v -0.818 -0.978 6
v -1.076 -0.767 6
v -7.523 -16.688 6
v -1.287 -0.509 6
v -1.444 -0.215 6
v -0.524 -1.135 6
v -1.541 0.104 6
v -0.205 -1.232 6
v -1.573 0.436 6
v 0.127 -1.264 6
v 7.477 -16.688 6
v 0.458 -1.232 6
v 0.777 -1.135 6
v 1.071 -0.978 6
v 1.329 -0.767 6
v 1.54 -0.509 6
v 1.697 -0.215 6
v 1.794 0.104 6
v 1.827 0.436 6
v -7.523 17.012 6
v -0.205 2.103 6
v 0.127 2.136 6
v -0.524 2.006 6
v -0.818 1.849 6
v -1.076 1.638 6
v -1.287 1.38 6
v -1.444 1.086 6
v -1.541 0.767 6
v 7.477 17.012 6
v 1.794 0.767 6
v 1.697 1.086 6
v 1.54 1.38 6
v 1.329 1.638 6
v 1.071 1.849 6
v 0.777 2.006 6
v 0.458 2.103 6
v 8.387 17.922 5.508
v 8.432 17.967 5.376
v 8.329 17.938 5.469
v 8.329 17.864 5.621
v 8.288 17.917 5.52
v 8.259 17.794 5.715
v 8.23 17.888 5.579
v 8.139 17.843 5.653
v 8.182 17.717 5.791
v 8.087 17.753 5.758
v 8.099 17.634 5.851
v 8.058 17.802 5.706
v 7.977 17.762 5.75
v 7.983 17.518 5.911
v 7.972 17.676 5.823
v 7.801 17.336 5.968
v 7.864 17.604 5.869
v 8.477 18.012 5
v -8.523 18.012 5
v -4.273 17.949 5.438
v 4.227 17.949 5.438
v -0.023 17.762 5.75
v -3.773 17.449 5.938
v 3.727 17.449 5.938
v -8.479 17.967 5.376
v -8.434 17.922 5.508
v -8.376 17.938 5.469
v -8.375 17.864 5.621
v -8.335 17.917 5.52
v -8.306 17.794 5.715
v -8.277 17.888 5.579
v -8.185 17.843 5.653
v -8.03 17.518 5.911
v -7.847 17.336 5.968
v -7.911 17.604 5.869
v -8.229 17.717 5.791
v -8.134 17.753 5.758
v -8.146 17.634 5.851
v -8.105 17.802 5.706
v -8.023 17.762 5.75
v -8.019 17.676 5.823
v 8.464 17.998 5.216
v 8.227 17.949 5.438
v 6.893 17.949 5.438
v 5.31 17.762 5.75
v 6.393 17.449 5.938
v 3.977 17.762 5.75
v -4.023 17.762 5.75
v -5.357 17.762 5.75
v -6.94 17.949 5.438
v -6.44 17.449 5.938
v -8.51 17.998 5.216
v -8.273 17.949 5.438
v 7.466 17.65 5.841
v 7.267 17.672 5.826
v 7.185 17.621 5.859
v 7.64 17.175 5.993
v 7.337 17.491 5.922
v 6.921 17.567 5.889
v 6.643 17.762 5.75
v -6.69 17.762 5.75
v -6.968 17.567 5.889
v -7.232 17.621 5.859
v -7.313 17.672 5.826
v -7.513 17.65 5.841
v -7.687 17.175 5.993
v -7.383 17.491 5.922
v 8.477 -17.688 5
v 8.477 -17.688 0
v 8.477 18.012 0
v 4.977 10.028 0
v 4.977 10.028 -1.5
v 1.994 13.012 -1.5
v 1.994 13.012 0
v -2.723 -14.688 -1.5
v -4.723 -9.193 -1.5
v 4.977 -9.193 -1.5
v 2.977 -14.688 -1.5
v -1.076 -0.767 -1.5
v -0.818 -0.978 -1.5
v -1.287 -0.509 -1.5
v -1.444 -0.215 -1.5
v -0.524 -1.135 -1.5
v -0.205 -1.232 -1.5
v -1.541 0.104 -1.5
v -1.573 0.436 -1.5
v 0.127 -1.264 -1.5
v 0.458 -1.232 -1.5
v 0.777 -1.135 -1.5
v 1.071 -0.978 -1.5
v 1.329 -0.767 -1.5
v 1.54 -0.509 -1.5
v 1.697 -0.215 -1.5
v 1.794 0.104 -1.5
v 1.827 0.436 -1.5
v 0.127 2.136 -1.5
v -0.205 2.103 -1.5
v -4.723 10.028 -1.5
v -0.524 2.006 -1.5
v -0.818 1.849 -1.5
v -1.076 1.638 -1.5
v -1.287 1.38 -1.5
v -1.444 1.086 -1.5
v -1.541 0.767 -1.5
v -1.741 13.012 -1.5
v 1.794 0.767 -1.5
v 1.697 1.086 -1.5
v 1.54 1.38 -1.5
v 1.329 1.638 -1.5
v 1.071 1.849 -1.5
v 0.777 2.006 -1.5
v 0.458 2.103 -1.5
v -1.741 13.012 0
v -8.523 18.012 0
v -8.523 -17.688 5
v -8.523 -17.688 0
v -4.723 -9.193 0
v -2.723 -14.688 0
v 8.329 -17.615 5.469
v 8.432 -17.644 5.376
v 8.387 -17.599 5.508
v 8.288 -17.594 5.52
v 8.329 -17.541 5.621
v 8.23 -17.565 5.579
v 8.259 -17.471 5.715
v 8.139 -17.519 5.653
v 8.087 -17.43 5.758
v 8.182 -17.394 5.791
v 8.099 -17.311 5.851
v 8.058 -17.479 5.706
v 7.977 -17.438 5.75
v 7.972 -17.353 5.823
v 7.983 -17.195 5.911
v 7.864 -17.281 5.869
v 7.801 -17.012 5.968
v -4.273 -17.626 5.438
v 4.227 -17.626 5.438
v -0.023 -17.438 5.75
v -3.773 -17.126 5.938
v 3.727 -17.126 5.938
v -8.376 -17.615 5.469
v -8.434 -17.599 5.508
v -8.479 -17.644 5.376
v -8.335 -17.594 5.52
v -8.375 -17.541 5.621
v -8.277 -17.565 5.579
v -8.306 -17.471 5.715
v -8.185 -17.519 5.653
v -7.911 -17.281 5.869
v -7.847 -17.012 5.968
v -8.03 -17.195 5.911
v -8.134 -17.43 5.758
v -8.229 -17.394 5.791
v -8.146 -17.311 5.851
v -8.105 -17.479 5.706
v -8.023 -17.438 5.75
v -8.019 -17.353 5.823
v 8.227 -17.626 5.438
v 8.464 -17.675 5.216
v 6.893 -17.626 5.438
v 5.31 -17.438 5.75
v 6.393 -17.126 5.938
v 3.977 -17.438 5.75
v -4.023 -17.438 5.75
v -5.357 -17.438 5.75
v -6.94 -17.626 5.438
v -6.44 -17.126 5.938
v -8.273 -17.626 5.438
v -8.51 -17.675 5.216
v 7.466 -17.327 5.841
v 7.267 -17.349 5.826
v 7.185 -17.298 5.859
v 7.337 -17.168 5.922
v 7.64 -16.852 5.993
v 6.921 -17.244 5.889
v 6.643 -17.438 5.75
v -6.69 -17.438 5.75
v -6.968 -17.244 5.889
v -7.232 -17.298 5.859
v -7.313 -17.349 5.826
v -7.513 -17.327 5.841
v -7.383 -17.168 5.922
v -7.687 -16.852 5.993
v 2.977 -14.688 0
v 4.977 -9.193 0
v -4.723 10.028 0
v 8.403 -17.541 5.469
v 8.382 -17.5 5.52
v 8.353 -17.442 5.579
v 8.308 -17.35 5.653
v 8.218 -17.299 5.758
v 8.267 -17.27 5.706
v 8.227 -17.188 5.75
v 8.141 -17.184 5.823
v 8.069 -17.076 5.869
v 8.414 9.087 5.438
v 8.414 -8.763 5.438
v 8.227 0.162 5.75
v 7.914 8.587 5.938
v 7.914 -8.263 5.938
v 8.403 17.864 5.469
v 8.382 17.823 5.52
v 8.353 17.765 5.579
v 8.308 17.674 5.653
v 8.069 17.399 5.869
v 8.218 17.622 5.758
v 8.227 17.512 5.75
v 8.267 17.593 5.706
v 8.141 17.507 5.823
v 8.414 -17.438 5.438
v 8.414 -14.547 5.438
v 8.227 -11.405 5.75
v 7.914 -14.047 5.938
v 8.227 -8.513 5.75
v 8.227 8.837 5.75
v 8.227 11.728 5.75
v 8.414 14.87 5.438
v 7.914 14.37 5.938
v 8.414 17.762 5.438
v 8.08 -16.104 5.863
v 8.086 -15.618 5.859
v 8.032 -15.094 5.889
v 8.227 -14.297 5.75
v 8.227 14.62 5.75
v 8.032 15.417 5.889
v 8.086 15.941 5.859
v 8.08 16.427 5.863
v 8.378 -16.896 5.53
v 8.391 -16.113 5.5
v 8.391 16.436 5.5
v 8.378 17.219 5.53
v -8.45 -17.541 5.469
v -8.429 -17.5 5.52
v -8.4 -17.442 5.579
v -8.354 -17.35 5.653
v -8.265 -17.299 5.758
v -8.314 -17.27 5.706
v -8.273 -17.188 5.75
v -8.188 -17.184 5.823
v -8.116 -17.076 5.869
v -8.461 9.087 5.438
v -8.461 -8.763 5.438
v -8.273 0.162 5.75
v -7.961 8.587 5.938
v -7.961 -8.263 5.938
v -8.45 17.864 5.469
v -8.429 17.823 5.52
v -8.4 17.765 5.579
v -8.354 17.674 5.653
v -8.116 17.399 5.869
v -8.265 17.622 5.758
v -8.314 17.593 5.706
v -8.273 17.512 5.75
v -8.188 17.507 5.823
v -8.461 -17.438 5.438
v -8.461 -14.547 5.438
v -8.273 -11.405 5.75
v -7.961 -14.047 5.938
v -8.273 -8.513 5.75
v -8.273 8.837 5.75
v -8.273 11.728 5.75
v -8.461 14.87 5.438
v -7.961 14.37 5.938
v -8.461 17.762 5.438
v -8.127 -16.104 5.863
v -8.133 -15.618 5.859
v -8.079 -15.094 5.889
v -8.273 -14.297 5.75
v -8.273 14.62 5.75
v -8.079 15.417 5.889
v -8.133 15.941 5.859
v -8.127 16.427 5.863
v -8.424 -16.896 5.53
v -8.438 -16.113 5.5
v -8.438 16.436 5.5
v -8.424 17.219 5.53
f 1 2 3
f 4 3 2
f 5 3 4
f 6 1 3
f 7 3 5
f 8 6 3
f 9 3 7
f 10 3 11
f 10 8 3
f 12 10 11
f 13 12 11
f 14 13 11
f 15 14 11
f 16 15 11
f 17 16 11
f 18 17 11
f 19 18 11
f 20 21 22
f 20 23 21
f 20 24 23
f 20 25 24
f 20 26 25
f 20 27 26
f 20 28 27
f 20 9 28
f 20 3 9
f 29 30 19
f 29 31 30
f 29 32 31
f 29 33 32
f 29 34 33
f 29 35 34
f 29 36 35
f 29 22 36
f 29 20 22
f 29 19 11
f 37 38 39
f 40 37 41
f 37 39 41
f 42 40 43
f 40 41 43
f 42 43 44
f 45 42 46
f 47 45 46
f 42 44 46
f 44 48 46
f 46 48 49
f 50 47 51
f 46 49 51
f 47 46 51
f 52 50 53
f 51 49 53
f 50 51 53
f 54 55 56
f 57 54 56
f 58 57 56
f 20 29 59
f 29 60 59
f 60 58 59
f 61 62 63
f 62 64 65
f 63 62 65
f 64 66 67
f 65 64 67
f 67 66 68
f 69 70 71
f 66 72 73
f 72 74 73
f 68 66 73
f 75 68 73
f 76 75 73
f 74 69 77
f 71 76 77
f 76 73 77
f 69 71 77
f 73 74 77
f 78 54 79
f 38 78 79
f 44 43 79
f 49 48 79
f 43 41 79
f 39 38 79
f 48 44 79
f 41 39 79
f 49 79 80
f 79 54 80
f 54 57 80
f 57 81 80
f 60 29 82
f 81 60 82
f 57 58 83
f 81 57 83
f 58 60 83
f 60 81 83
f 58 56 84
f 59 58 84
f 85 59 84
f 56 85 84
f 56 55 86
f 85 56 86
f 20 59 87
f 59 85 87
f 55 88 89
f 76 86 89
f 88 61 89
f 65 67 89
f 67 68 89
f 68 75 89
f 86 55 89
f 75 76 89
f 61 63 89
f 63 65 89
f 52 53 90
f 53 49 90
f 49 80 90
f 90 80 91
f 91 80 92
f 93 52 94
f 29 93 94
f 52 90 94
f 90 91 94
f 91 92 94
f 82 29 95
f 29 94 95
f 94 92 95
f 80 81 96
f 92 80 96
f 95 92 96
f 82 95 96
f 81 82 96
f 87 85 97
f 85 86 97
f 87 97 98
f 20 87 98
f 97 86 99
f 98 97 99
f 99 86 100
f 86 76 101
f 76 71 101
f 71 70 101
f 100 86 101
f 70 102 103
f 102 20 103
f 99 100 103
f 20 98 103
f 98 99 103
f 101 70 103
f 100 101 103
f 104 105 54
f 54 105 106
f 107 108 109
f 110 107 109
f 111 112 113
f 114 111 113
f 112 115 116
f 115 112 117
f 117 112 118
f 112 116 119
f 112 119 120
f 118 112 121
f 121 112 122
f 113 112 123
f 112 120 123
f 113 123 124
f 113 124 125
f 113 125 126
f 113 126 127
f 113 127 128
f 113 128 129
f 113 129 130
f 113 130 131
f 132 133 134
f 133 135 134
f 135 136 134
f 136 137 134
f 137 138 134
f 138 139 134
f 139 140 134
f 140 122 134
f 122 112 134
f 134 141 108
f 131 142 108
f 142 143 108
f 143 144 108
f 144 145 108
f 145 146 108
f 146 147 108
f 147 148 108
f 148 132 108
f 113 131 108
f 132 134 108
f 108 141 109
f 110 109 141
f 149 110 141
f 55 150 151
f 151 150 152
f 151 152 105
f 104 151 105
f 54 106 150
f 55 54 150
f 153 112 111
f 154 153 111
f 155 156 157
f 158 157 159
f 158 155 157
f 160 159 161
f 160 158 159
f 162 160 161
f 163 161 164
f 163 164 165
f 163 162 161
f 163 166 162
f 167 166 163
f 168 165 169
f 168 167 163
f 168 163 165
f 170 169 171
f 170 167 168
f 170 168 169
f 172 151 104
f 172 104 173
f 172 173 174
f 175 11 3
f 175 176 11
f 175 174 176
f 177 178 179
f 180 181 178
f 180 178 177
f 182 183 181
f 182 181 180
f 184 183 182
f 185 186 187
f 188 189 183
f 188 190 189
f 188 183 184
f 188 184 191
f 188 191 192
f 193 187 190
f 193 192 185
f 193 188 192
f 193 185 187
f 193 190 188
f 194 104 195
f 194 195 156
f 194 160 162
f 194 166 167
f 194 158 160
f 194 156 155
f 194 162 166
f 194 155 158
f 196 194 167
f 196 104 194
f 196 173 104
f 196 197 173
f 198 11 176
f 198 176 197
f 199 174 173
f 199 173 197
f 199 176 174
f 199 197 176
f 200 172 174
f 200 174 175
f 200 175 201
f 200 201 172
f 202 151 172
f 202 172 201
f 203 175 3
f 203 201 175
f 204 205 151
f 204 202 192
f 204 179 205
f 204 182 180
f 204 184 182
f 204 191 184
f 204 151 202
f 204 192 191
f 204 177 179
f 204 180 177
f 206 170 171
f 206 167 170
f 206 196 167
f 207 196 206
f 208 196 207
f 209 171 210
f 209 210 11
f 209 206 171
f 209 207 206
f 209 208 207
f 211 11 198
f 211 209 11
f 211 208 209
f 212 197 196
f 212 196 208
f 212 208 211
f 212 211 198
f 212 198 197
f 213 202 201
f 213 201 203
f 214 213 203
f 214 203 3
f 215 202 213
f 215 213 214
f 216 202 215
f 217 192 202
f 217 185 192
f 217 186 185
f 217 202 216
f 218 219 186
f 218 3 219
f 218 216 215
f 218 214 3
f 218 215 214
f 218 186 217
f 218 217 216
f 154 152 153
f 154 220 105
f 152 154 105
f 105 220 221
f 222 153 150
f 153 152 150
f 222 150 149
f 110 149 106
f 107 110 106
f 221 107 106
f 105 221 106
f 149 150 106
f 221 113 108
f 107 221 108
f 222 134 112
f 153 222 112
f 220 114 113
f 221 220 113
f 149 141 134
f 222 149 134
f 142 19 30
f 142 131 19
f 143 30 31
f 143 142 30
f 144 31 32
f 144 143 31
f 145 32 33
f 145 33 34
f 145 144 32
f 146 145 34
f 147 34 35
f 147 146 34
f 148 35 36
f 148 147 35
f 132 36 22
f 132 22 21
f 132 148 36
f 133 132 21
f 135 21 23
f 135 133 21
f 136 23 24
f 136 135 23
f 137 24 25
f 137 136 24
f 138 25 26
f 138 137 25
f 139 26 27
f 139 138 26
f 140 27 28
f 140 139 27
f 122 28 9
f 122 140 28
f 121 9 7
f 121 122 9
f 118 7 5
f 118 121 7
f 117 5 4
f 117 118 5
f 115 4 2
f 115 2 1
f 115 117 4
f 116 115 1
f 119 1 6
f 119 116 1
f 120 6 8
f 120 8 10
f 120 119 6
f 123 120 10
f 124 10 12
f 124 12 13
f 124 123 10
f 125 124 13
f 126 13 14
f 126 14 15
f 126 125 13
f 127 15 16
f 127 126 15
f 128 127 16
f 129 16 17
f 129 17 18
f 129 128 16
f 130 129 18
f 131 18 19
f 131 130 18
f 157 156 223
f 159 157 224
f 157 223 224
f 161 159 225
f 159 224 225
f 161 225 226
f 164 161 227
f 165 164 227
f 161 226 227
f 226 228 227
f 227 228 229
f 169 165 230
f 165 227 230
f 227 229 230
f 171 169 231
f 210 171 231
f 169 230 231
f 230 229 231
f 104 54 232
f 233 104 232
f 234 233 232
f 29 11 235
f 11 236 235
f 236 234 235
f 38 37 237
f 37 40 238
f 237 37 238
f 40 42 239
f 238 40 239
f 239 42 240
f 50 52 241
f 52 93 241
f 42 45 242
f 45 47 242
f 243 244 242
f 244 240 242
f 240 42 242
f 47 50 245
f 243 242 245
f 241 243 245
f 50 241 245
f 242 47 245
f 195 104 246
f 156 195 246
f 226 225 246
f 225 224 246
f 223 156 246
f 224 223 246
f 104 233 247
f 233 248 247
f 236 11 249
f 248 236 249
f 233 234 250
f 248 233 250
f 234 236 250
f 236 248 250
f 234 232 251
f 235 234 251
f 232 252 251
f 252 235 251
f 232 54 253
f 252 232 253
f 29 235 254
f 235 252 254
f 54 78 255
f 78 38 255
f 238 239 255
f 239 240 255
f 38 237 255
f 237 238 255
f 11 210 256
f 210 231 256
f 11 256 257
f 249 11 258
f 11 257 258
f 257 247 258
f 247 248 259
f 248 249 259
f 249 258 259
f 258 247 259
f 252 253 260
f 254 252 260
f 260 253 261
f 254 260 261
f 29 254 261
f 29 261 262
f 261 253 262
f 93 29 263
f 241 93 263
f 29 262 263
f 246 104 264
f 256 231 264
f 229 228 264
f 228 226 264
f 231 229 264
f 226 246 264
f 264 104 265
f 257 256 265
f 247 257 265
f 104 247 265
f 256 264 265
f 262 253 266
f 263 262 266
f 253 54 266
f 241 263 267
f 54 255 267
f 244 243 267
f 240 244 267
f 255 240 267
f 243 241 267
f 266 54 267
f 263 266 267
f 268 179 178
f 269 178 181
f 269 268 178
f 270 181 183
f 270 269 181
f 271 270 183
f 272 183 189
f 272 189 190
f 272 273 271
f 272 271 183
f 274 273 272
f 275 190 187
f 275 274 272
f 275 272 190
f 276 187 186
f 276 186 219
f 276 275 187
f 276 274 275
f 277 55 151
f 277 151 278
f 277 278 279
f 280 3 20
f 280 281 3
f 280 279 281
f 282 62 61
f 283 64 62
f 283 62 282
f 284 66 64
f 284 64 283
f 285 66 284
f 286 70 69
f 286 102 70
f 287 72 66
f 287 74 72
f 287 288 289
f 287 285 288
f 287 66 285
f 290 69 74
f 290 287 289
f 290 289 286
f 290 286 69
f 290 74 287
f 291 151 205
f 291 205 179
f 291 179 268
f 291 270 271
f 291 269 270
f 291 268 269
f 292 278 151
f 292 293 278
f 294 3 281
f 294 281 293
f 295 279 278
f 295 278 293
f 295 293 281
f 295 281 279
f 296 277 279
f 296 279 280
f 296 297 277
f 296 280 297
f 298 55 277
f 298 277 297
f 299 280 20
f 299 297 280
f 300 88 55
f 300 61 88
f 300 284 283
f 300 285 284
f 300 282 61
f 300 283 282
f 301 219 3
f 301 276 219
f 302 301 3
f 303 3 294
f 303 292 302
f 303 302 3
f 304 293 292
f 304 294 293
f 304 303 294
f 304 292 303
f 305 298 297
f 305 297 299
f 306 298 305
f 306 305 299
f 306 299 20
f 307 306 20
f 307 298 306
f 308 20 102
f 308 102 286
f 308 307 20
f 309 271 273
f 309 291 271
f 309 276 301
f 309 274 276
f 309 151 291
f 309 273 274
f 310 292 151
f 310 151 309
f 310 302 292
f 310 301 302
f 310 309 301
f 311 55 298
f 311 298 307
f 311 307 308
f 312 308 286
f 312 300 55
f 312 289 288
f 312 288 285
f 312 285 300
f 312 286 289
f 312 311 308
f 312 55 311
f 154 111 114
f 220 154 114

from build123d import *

# Parameters (mm, degrees)
F0_R          = 1.7
F1_DEPTH      = 1.5
F1_DEPTH_BACK = 6
F2_DEPTH      = 6
F3_T1_DEPTH   = 22
F3_T3_DEPTH   = 40.7


# Not quite as in the source:
# - a fillet or chamfer that OpenCascade refuses, or shapes differently, is made with other operations: its cross-section is extruded or revolved along the edge and cut away or added


with BuildPart() as f1:
    # F0 (on Top) → F1 (new body, two sides)
    with BuildSketch(Plane.XY) as f1_sk:
        Polygon((-4.7234346752, 0.4355579215), (-4.7234346752, -9.1929948391), (-2.7234009317, -14.6884420785), (2.9765315813, -14.6884420785), (4.9765653248, -9.1929948391), (4.9765653248, 0.4355579215), (4.9765653248, 10.028440195), (1.9944189816, 13.0115579215), (0.1265653248, 13.0115579215), (-1.7412883319, 13.0115579215), (-4.7234346752, 10.028440195), align=None)
        with Locations((0.1265653248, 0.4355579215)):
            Circle(F0_R, mode=Mode.SUBTRACT)
    extrude(amount=-F1_DEPTH)
    extrude(f1_sk.sketch, amount=F1_DEPTH_BACK)

    # F0 (on Top) → F2 (join)
    with BuildSketch(Plane.XY):
        Polygon((-8.5234346752, -17.6884420785), (0.1265653248, -17.6884420785), (4.9765653248, -17.6884420785), (8.4765653248, -17.6884420785), (8.4765653248, 18.0115579215), (-8.5234346752, 18.0115579215), align=None)
        Polygon((-2.7234009317, -14.6884420785), (-4.7234346752, -9.1929948391), (-4.7234346752, 0.4355579215), (-4.7234346752, 10.028440195), (-1.7412883319, 13.0115579215), (0.1265653248, 13.0115579215), (1.9944189816, 13.0115579215), (4.9765653248, 10.028440195), (4.9765653248, 0.4355579215), (4.9765653248, -9.1929948391), (2.9765315813, -14.6884420785), align=None, mode=Mode.SUBTRACT)
    extrude(amount=F2_DEPTH)

    # F3: fillet of radius 1 on 4 edges, made by hand

    # F3_s2 → F3_t1 (cut)
    with BuildSketch(Plane.YZ.offset(-11.0234346752)):
        with BuildLine():
            add(Edge.make_bspline(
                [(18.0115579215, 5), (18.0115579215, 6), (17.0115579215, 6)],
                knots=[0, 0, 0, 1, 1, 1], degree=2, weights=[1, 1, 1]))
            Line((17.0115579215, 6), (18.0115579215, 6))
            Line((18.0115579215, 6), (18.0115579215, 5))
        make_face()
        with BuildLine():
            add(Edge.make_bspline(
                [(-17.6884420785, 5), (-17.6884420785, 6), (-16.6884420785, 6)],
                knots=[0, 0, 0, 1, 1, 1], degree=2, weights=[1, 1, 1]))
            Line((-16.6884420785, 6), (-17.6884420785, 6))
            Line((-17.6884420785, 6), (-17.6884420785, 5))
        make_face()
    extrude(amount=F3_T1_DEPTH, mode=Mode.SUBTRACT)

    # F3_s4 → F3_t3 (cut)
    with BuildSketch(Plane.XZ.offset(-20.5115579215)):
        with BuildLine():
            add(Edge.make_bspline(
                [(-8.5234346752, 5), (-8.5234346752, 6), (-7.5234346752, 6)],
                knots=[0, 0, 0, 1, 1, 1], degree=2, weights=[1, 1, 1]))
            Line((-7.5234346752, 6), (-8.5234346752, 6))
            Line((-8.5234346752, 6), (-8.5234346752, 5))
        make_face()
        with BuildLine():
            add(Edge.make_bspline(
                [(8.4765653248, 5), (8.4765653248, 6), (7.4765653248, 6)],
                knots=[0, 0, 0, 1, 1, 1], degree=2, weights=[1, 1, 1]))
            Line((7.4765653248, 6), (8.4765653248, 6))
            Line((8.4765653248, 6), (8.4765653248, 5))
        make_face()
    extrude(amount=F3_T3_DEPTH, mode=Mode.SUBTRACT)


solid = f1.part
